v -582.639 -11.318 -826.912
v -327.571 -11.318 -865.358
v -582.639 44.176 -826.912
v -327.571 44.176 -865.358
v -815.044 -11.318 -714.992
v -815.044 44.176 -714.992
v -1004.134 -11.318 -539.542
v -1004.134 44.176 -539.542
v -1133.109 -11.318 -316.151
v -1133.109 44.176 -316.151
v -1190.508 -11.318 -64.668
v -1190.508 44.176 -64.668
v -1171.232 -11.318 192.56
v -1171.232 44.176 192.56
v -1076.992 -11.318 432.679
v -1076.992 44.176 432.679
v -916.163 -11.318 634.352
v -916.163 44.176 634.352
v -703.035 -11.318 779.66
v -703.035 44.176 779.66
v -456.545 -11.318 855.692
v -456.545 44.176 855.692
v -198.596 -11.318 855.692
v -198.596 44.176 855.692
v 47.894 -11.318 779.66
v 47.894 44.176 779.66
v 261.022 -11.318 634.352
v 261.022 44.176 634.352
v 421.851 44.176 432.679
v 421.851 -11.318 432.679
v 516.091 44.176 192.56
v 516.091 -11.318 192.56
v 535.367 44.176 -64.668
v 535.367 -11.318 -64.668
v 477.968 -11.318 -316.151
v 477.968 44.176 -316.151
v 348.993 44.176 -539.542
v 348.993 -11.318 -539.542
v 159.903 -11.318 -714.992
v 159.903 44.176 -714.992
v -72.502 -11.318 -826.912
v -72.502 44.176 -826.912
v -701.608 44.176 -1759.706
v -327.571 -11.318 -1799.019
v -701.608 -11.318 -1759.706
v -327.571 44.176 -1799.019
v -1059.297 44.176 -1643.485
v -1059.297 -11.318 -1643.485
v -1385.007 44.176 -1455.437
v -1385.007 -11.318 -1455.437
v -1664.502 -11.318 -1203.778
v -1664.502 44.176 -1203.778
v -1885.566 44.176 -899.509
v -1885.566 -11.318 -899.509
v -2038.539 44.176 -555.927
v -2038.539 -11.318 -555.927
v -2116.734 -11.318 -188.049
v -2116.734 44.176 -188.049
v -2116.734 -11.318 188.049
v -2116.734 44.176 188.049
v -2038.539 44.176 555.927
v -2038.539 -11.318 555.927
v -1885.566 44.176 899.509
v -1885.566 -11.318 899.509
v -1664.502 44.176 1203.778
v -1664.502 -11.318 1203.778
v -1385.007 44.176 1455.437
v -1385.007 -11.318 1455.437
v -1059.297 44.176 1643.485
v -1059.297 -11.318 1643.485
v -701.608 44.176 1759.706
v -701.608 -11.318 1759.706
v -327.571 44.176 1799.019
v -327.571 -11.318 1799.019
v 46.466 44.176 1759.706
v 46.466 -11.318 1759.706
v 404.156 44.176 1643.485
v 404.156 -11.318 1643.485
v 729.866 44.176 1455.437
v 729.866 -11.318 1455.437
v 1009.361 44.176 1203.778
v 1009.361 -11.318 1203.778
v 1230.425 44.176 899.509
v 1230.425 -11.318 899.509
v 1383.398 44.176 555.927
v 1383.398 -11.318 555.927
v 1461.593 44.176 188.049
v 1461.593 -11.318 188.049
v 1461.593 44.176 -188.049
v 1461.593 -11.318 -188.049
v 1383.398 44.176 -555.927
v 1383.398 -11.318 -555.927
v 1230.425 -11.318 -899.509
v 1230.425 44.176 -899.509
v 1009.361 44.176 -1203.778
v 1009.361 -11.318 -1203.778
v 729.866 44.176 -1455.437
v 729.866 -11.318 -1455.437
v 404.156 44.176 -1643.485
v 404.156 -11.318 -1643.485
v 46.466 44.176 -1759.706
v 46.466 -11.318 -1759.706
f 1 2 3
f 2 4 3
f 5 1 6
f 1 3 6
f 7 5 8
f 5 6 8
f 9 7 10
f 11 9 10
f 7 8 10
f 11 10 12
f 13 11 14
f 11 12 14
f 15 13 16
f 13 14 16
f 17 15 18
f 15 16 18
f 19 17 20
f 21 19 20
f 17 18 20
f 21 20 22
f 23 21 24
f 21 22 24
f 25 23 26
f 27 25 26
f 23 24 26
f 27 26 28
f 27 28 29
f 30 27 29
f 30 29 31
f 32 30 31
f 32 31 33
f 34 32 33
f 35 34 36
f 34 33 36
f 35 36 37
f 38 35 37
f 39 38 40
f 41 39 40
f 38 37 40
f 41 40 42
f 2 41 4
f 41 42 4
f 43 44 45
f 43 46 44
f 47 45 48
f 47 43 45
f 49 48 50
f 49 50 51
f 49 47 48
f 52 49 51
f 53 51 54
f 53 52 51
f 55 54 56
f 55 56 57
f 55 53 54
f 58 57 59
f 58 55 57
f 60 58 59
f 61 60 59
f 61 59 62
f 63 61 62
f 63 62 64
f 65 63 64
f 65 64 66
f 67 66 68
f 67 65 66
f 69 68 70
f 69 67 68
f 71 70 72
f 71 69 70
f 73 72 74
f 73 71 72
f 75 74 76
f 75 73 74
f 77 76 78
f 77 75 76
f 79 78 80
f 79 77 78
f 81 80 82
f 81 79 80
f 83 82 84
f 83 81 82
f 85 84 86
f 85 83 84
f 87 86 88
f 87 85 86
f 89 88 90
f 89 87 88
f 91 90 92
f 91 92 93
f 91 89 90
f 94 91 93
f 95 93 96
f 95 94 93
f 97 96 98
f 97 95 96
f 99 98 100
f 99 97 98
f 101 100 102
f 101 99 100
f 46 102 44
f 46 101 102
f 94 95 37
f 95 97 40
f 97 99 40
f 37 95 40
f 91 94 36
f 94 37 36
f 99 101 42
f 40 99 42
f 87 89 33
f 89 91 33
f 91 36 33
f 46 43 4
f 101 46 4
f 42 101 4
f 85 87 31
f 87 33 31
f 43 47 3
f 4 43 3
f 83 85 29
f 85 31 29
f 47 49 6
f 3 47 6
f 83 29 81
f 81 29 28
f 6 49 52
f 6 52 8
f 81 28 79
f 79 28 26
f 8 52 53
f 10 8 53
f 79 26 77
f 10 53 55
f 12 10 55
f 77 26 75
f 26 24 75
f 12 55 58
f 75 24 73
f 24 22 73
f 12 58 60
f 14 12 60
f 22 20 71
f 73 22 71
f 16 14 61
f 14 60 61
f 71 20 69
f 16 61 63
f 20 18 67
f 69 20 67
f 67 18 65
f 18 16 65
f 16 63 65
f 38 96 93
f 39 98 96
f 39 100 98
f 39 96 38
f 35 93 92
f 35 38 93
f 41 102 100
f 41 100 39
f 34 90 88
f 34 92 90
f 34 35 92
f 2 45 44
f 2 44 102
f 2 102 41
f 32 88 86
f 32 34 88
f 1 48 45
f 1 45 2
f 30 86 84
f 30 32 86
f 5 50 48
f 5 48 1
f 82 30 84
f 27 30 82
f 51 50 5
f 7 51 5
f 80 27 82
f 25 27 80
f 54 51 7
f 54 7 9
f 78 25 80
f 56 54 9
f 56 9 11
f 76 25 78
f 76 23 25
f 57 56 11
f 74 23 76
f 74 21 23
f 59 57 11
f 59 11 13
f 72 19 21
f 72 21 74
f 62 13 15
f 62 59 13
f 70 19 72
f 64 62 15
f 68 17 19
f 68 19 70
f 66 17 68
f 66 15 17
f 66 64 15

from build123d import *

# Parameters (mm, degrees)
SKETCH1_W    = 233.415272748
SKETCH1_H    = 13.873483364
SCALE1_SCALE = 5
SCALE2_SCALE = 0.8


with BuildPart() as part:
    # Sketch1 → Revolve1 (revolve)
    with BuildSketch(Plane.XY, mode=Mode.PRIVATE) as revolve1_sk:
        with Locations((5.476375012, 16.429125037)):
            Rectangle(SKETCH1_W, SKETCH1_H)
    revolve(revolve1_sk.sketch.rotate(Axis((-327.570639078, 9.492383355, 0), (0, 1, 0)), 90), axis=Axis((-327.570639078, 9.492383355, 0), (0, 1, 0)))


with BuildPart() as part_1:
    # Scale1: scaled about (-327.570639078, 16.429125037, 0)
    add(part.part.scale(SCALE1_SCALE).moved(Location((1310.282556312, -65.716500148, 0))))


with BuildPart() as part_2:
    # Scale2: scaled about (-327.570639076, 16.429125037, 0)
    add(part_1.part.scale(SCALE2_SCALE).moved(Location((-65.514127815, 3.285825007, 0))))


solid = part_2.part
